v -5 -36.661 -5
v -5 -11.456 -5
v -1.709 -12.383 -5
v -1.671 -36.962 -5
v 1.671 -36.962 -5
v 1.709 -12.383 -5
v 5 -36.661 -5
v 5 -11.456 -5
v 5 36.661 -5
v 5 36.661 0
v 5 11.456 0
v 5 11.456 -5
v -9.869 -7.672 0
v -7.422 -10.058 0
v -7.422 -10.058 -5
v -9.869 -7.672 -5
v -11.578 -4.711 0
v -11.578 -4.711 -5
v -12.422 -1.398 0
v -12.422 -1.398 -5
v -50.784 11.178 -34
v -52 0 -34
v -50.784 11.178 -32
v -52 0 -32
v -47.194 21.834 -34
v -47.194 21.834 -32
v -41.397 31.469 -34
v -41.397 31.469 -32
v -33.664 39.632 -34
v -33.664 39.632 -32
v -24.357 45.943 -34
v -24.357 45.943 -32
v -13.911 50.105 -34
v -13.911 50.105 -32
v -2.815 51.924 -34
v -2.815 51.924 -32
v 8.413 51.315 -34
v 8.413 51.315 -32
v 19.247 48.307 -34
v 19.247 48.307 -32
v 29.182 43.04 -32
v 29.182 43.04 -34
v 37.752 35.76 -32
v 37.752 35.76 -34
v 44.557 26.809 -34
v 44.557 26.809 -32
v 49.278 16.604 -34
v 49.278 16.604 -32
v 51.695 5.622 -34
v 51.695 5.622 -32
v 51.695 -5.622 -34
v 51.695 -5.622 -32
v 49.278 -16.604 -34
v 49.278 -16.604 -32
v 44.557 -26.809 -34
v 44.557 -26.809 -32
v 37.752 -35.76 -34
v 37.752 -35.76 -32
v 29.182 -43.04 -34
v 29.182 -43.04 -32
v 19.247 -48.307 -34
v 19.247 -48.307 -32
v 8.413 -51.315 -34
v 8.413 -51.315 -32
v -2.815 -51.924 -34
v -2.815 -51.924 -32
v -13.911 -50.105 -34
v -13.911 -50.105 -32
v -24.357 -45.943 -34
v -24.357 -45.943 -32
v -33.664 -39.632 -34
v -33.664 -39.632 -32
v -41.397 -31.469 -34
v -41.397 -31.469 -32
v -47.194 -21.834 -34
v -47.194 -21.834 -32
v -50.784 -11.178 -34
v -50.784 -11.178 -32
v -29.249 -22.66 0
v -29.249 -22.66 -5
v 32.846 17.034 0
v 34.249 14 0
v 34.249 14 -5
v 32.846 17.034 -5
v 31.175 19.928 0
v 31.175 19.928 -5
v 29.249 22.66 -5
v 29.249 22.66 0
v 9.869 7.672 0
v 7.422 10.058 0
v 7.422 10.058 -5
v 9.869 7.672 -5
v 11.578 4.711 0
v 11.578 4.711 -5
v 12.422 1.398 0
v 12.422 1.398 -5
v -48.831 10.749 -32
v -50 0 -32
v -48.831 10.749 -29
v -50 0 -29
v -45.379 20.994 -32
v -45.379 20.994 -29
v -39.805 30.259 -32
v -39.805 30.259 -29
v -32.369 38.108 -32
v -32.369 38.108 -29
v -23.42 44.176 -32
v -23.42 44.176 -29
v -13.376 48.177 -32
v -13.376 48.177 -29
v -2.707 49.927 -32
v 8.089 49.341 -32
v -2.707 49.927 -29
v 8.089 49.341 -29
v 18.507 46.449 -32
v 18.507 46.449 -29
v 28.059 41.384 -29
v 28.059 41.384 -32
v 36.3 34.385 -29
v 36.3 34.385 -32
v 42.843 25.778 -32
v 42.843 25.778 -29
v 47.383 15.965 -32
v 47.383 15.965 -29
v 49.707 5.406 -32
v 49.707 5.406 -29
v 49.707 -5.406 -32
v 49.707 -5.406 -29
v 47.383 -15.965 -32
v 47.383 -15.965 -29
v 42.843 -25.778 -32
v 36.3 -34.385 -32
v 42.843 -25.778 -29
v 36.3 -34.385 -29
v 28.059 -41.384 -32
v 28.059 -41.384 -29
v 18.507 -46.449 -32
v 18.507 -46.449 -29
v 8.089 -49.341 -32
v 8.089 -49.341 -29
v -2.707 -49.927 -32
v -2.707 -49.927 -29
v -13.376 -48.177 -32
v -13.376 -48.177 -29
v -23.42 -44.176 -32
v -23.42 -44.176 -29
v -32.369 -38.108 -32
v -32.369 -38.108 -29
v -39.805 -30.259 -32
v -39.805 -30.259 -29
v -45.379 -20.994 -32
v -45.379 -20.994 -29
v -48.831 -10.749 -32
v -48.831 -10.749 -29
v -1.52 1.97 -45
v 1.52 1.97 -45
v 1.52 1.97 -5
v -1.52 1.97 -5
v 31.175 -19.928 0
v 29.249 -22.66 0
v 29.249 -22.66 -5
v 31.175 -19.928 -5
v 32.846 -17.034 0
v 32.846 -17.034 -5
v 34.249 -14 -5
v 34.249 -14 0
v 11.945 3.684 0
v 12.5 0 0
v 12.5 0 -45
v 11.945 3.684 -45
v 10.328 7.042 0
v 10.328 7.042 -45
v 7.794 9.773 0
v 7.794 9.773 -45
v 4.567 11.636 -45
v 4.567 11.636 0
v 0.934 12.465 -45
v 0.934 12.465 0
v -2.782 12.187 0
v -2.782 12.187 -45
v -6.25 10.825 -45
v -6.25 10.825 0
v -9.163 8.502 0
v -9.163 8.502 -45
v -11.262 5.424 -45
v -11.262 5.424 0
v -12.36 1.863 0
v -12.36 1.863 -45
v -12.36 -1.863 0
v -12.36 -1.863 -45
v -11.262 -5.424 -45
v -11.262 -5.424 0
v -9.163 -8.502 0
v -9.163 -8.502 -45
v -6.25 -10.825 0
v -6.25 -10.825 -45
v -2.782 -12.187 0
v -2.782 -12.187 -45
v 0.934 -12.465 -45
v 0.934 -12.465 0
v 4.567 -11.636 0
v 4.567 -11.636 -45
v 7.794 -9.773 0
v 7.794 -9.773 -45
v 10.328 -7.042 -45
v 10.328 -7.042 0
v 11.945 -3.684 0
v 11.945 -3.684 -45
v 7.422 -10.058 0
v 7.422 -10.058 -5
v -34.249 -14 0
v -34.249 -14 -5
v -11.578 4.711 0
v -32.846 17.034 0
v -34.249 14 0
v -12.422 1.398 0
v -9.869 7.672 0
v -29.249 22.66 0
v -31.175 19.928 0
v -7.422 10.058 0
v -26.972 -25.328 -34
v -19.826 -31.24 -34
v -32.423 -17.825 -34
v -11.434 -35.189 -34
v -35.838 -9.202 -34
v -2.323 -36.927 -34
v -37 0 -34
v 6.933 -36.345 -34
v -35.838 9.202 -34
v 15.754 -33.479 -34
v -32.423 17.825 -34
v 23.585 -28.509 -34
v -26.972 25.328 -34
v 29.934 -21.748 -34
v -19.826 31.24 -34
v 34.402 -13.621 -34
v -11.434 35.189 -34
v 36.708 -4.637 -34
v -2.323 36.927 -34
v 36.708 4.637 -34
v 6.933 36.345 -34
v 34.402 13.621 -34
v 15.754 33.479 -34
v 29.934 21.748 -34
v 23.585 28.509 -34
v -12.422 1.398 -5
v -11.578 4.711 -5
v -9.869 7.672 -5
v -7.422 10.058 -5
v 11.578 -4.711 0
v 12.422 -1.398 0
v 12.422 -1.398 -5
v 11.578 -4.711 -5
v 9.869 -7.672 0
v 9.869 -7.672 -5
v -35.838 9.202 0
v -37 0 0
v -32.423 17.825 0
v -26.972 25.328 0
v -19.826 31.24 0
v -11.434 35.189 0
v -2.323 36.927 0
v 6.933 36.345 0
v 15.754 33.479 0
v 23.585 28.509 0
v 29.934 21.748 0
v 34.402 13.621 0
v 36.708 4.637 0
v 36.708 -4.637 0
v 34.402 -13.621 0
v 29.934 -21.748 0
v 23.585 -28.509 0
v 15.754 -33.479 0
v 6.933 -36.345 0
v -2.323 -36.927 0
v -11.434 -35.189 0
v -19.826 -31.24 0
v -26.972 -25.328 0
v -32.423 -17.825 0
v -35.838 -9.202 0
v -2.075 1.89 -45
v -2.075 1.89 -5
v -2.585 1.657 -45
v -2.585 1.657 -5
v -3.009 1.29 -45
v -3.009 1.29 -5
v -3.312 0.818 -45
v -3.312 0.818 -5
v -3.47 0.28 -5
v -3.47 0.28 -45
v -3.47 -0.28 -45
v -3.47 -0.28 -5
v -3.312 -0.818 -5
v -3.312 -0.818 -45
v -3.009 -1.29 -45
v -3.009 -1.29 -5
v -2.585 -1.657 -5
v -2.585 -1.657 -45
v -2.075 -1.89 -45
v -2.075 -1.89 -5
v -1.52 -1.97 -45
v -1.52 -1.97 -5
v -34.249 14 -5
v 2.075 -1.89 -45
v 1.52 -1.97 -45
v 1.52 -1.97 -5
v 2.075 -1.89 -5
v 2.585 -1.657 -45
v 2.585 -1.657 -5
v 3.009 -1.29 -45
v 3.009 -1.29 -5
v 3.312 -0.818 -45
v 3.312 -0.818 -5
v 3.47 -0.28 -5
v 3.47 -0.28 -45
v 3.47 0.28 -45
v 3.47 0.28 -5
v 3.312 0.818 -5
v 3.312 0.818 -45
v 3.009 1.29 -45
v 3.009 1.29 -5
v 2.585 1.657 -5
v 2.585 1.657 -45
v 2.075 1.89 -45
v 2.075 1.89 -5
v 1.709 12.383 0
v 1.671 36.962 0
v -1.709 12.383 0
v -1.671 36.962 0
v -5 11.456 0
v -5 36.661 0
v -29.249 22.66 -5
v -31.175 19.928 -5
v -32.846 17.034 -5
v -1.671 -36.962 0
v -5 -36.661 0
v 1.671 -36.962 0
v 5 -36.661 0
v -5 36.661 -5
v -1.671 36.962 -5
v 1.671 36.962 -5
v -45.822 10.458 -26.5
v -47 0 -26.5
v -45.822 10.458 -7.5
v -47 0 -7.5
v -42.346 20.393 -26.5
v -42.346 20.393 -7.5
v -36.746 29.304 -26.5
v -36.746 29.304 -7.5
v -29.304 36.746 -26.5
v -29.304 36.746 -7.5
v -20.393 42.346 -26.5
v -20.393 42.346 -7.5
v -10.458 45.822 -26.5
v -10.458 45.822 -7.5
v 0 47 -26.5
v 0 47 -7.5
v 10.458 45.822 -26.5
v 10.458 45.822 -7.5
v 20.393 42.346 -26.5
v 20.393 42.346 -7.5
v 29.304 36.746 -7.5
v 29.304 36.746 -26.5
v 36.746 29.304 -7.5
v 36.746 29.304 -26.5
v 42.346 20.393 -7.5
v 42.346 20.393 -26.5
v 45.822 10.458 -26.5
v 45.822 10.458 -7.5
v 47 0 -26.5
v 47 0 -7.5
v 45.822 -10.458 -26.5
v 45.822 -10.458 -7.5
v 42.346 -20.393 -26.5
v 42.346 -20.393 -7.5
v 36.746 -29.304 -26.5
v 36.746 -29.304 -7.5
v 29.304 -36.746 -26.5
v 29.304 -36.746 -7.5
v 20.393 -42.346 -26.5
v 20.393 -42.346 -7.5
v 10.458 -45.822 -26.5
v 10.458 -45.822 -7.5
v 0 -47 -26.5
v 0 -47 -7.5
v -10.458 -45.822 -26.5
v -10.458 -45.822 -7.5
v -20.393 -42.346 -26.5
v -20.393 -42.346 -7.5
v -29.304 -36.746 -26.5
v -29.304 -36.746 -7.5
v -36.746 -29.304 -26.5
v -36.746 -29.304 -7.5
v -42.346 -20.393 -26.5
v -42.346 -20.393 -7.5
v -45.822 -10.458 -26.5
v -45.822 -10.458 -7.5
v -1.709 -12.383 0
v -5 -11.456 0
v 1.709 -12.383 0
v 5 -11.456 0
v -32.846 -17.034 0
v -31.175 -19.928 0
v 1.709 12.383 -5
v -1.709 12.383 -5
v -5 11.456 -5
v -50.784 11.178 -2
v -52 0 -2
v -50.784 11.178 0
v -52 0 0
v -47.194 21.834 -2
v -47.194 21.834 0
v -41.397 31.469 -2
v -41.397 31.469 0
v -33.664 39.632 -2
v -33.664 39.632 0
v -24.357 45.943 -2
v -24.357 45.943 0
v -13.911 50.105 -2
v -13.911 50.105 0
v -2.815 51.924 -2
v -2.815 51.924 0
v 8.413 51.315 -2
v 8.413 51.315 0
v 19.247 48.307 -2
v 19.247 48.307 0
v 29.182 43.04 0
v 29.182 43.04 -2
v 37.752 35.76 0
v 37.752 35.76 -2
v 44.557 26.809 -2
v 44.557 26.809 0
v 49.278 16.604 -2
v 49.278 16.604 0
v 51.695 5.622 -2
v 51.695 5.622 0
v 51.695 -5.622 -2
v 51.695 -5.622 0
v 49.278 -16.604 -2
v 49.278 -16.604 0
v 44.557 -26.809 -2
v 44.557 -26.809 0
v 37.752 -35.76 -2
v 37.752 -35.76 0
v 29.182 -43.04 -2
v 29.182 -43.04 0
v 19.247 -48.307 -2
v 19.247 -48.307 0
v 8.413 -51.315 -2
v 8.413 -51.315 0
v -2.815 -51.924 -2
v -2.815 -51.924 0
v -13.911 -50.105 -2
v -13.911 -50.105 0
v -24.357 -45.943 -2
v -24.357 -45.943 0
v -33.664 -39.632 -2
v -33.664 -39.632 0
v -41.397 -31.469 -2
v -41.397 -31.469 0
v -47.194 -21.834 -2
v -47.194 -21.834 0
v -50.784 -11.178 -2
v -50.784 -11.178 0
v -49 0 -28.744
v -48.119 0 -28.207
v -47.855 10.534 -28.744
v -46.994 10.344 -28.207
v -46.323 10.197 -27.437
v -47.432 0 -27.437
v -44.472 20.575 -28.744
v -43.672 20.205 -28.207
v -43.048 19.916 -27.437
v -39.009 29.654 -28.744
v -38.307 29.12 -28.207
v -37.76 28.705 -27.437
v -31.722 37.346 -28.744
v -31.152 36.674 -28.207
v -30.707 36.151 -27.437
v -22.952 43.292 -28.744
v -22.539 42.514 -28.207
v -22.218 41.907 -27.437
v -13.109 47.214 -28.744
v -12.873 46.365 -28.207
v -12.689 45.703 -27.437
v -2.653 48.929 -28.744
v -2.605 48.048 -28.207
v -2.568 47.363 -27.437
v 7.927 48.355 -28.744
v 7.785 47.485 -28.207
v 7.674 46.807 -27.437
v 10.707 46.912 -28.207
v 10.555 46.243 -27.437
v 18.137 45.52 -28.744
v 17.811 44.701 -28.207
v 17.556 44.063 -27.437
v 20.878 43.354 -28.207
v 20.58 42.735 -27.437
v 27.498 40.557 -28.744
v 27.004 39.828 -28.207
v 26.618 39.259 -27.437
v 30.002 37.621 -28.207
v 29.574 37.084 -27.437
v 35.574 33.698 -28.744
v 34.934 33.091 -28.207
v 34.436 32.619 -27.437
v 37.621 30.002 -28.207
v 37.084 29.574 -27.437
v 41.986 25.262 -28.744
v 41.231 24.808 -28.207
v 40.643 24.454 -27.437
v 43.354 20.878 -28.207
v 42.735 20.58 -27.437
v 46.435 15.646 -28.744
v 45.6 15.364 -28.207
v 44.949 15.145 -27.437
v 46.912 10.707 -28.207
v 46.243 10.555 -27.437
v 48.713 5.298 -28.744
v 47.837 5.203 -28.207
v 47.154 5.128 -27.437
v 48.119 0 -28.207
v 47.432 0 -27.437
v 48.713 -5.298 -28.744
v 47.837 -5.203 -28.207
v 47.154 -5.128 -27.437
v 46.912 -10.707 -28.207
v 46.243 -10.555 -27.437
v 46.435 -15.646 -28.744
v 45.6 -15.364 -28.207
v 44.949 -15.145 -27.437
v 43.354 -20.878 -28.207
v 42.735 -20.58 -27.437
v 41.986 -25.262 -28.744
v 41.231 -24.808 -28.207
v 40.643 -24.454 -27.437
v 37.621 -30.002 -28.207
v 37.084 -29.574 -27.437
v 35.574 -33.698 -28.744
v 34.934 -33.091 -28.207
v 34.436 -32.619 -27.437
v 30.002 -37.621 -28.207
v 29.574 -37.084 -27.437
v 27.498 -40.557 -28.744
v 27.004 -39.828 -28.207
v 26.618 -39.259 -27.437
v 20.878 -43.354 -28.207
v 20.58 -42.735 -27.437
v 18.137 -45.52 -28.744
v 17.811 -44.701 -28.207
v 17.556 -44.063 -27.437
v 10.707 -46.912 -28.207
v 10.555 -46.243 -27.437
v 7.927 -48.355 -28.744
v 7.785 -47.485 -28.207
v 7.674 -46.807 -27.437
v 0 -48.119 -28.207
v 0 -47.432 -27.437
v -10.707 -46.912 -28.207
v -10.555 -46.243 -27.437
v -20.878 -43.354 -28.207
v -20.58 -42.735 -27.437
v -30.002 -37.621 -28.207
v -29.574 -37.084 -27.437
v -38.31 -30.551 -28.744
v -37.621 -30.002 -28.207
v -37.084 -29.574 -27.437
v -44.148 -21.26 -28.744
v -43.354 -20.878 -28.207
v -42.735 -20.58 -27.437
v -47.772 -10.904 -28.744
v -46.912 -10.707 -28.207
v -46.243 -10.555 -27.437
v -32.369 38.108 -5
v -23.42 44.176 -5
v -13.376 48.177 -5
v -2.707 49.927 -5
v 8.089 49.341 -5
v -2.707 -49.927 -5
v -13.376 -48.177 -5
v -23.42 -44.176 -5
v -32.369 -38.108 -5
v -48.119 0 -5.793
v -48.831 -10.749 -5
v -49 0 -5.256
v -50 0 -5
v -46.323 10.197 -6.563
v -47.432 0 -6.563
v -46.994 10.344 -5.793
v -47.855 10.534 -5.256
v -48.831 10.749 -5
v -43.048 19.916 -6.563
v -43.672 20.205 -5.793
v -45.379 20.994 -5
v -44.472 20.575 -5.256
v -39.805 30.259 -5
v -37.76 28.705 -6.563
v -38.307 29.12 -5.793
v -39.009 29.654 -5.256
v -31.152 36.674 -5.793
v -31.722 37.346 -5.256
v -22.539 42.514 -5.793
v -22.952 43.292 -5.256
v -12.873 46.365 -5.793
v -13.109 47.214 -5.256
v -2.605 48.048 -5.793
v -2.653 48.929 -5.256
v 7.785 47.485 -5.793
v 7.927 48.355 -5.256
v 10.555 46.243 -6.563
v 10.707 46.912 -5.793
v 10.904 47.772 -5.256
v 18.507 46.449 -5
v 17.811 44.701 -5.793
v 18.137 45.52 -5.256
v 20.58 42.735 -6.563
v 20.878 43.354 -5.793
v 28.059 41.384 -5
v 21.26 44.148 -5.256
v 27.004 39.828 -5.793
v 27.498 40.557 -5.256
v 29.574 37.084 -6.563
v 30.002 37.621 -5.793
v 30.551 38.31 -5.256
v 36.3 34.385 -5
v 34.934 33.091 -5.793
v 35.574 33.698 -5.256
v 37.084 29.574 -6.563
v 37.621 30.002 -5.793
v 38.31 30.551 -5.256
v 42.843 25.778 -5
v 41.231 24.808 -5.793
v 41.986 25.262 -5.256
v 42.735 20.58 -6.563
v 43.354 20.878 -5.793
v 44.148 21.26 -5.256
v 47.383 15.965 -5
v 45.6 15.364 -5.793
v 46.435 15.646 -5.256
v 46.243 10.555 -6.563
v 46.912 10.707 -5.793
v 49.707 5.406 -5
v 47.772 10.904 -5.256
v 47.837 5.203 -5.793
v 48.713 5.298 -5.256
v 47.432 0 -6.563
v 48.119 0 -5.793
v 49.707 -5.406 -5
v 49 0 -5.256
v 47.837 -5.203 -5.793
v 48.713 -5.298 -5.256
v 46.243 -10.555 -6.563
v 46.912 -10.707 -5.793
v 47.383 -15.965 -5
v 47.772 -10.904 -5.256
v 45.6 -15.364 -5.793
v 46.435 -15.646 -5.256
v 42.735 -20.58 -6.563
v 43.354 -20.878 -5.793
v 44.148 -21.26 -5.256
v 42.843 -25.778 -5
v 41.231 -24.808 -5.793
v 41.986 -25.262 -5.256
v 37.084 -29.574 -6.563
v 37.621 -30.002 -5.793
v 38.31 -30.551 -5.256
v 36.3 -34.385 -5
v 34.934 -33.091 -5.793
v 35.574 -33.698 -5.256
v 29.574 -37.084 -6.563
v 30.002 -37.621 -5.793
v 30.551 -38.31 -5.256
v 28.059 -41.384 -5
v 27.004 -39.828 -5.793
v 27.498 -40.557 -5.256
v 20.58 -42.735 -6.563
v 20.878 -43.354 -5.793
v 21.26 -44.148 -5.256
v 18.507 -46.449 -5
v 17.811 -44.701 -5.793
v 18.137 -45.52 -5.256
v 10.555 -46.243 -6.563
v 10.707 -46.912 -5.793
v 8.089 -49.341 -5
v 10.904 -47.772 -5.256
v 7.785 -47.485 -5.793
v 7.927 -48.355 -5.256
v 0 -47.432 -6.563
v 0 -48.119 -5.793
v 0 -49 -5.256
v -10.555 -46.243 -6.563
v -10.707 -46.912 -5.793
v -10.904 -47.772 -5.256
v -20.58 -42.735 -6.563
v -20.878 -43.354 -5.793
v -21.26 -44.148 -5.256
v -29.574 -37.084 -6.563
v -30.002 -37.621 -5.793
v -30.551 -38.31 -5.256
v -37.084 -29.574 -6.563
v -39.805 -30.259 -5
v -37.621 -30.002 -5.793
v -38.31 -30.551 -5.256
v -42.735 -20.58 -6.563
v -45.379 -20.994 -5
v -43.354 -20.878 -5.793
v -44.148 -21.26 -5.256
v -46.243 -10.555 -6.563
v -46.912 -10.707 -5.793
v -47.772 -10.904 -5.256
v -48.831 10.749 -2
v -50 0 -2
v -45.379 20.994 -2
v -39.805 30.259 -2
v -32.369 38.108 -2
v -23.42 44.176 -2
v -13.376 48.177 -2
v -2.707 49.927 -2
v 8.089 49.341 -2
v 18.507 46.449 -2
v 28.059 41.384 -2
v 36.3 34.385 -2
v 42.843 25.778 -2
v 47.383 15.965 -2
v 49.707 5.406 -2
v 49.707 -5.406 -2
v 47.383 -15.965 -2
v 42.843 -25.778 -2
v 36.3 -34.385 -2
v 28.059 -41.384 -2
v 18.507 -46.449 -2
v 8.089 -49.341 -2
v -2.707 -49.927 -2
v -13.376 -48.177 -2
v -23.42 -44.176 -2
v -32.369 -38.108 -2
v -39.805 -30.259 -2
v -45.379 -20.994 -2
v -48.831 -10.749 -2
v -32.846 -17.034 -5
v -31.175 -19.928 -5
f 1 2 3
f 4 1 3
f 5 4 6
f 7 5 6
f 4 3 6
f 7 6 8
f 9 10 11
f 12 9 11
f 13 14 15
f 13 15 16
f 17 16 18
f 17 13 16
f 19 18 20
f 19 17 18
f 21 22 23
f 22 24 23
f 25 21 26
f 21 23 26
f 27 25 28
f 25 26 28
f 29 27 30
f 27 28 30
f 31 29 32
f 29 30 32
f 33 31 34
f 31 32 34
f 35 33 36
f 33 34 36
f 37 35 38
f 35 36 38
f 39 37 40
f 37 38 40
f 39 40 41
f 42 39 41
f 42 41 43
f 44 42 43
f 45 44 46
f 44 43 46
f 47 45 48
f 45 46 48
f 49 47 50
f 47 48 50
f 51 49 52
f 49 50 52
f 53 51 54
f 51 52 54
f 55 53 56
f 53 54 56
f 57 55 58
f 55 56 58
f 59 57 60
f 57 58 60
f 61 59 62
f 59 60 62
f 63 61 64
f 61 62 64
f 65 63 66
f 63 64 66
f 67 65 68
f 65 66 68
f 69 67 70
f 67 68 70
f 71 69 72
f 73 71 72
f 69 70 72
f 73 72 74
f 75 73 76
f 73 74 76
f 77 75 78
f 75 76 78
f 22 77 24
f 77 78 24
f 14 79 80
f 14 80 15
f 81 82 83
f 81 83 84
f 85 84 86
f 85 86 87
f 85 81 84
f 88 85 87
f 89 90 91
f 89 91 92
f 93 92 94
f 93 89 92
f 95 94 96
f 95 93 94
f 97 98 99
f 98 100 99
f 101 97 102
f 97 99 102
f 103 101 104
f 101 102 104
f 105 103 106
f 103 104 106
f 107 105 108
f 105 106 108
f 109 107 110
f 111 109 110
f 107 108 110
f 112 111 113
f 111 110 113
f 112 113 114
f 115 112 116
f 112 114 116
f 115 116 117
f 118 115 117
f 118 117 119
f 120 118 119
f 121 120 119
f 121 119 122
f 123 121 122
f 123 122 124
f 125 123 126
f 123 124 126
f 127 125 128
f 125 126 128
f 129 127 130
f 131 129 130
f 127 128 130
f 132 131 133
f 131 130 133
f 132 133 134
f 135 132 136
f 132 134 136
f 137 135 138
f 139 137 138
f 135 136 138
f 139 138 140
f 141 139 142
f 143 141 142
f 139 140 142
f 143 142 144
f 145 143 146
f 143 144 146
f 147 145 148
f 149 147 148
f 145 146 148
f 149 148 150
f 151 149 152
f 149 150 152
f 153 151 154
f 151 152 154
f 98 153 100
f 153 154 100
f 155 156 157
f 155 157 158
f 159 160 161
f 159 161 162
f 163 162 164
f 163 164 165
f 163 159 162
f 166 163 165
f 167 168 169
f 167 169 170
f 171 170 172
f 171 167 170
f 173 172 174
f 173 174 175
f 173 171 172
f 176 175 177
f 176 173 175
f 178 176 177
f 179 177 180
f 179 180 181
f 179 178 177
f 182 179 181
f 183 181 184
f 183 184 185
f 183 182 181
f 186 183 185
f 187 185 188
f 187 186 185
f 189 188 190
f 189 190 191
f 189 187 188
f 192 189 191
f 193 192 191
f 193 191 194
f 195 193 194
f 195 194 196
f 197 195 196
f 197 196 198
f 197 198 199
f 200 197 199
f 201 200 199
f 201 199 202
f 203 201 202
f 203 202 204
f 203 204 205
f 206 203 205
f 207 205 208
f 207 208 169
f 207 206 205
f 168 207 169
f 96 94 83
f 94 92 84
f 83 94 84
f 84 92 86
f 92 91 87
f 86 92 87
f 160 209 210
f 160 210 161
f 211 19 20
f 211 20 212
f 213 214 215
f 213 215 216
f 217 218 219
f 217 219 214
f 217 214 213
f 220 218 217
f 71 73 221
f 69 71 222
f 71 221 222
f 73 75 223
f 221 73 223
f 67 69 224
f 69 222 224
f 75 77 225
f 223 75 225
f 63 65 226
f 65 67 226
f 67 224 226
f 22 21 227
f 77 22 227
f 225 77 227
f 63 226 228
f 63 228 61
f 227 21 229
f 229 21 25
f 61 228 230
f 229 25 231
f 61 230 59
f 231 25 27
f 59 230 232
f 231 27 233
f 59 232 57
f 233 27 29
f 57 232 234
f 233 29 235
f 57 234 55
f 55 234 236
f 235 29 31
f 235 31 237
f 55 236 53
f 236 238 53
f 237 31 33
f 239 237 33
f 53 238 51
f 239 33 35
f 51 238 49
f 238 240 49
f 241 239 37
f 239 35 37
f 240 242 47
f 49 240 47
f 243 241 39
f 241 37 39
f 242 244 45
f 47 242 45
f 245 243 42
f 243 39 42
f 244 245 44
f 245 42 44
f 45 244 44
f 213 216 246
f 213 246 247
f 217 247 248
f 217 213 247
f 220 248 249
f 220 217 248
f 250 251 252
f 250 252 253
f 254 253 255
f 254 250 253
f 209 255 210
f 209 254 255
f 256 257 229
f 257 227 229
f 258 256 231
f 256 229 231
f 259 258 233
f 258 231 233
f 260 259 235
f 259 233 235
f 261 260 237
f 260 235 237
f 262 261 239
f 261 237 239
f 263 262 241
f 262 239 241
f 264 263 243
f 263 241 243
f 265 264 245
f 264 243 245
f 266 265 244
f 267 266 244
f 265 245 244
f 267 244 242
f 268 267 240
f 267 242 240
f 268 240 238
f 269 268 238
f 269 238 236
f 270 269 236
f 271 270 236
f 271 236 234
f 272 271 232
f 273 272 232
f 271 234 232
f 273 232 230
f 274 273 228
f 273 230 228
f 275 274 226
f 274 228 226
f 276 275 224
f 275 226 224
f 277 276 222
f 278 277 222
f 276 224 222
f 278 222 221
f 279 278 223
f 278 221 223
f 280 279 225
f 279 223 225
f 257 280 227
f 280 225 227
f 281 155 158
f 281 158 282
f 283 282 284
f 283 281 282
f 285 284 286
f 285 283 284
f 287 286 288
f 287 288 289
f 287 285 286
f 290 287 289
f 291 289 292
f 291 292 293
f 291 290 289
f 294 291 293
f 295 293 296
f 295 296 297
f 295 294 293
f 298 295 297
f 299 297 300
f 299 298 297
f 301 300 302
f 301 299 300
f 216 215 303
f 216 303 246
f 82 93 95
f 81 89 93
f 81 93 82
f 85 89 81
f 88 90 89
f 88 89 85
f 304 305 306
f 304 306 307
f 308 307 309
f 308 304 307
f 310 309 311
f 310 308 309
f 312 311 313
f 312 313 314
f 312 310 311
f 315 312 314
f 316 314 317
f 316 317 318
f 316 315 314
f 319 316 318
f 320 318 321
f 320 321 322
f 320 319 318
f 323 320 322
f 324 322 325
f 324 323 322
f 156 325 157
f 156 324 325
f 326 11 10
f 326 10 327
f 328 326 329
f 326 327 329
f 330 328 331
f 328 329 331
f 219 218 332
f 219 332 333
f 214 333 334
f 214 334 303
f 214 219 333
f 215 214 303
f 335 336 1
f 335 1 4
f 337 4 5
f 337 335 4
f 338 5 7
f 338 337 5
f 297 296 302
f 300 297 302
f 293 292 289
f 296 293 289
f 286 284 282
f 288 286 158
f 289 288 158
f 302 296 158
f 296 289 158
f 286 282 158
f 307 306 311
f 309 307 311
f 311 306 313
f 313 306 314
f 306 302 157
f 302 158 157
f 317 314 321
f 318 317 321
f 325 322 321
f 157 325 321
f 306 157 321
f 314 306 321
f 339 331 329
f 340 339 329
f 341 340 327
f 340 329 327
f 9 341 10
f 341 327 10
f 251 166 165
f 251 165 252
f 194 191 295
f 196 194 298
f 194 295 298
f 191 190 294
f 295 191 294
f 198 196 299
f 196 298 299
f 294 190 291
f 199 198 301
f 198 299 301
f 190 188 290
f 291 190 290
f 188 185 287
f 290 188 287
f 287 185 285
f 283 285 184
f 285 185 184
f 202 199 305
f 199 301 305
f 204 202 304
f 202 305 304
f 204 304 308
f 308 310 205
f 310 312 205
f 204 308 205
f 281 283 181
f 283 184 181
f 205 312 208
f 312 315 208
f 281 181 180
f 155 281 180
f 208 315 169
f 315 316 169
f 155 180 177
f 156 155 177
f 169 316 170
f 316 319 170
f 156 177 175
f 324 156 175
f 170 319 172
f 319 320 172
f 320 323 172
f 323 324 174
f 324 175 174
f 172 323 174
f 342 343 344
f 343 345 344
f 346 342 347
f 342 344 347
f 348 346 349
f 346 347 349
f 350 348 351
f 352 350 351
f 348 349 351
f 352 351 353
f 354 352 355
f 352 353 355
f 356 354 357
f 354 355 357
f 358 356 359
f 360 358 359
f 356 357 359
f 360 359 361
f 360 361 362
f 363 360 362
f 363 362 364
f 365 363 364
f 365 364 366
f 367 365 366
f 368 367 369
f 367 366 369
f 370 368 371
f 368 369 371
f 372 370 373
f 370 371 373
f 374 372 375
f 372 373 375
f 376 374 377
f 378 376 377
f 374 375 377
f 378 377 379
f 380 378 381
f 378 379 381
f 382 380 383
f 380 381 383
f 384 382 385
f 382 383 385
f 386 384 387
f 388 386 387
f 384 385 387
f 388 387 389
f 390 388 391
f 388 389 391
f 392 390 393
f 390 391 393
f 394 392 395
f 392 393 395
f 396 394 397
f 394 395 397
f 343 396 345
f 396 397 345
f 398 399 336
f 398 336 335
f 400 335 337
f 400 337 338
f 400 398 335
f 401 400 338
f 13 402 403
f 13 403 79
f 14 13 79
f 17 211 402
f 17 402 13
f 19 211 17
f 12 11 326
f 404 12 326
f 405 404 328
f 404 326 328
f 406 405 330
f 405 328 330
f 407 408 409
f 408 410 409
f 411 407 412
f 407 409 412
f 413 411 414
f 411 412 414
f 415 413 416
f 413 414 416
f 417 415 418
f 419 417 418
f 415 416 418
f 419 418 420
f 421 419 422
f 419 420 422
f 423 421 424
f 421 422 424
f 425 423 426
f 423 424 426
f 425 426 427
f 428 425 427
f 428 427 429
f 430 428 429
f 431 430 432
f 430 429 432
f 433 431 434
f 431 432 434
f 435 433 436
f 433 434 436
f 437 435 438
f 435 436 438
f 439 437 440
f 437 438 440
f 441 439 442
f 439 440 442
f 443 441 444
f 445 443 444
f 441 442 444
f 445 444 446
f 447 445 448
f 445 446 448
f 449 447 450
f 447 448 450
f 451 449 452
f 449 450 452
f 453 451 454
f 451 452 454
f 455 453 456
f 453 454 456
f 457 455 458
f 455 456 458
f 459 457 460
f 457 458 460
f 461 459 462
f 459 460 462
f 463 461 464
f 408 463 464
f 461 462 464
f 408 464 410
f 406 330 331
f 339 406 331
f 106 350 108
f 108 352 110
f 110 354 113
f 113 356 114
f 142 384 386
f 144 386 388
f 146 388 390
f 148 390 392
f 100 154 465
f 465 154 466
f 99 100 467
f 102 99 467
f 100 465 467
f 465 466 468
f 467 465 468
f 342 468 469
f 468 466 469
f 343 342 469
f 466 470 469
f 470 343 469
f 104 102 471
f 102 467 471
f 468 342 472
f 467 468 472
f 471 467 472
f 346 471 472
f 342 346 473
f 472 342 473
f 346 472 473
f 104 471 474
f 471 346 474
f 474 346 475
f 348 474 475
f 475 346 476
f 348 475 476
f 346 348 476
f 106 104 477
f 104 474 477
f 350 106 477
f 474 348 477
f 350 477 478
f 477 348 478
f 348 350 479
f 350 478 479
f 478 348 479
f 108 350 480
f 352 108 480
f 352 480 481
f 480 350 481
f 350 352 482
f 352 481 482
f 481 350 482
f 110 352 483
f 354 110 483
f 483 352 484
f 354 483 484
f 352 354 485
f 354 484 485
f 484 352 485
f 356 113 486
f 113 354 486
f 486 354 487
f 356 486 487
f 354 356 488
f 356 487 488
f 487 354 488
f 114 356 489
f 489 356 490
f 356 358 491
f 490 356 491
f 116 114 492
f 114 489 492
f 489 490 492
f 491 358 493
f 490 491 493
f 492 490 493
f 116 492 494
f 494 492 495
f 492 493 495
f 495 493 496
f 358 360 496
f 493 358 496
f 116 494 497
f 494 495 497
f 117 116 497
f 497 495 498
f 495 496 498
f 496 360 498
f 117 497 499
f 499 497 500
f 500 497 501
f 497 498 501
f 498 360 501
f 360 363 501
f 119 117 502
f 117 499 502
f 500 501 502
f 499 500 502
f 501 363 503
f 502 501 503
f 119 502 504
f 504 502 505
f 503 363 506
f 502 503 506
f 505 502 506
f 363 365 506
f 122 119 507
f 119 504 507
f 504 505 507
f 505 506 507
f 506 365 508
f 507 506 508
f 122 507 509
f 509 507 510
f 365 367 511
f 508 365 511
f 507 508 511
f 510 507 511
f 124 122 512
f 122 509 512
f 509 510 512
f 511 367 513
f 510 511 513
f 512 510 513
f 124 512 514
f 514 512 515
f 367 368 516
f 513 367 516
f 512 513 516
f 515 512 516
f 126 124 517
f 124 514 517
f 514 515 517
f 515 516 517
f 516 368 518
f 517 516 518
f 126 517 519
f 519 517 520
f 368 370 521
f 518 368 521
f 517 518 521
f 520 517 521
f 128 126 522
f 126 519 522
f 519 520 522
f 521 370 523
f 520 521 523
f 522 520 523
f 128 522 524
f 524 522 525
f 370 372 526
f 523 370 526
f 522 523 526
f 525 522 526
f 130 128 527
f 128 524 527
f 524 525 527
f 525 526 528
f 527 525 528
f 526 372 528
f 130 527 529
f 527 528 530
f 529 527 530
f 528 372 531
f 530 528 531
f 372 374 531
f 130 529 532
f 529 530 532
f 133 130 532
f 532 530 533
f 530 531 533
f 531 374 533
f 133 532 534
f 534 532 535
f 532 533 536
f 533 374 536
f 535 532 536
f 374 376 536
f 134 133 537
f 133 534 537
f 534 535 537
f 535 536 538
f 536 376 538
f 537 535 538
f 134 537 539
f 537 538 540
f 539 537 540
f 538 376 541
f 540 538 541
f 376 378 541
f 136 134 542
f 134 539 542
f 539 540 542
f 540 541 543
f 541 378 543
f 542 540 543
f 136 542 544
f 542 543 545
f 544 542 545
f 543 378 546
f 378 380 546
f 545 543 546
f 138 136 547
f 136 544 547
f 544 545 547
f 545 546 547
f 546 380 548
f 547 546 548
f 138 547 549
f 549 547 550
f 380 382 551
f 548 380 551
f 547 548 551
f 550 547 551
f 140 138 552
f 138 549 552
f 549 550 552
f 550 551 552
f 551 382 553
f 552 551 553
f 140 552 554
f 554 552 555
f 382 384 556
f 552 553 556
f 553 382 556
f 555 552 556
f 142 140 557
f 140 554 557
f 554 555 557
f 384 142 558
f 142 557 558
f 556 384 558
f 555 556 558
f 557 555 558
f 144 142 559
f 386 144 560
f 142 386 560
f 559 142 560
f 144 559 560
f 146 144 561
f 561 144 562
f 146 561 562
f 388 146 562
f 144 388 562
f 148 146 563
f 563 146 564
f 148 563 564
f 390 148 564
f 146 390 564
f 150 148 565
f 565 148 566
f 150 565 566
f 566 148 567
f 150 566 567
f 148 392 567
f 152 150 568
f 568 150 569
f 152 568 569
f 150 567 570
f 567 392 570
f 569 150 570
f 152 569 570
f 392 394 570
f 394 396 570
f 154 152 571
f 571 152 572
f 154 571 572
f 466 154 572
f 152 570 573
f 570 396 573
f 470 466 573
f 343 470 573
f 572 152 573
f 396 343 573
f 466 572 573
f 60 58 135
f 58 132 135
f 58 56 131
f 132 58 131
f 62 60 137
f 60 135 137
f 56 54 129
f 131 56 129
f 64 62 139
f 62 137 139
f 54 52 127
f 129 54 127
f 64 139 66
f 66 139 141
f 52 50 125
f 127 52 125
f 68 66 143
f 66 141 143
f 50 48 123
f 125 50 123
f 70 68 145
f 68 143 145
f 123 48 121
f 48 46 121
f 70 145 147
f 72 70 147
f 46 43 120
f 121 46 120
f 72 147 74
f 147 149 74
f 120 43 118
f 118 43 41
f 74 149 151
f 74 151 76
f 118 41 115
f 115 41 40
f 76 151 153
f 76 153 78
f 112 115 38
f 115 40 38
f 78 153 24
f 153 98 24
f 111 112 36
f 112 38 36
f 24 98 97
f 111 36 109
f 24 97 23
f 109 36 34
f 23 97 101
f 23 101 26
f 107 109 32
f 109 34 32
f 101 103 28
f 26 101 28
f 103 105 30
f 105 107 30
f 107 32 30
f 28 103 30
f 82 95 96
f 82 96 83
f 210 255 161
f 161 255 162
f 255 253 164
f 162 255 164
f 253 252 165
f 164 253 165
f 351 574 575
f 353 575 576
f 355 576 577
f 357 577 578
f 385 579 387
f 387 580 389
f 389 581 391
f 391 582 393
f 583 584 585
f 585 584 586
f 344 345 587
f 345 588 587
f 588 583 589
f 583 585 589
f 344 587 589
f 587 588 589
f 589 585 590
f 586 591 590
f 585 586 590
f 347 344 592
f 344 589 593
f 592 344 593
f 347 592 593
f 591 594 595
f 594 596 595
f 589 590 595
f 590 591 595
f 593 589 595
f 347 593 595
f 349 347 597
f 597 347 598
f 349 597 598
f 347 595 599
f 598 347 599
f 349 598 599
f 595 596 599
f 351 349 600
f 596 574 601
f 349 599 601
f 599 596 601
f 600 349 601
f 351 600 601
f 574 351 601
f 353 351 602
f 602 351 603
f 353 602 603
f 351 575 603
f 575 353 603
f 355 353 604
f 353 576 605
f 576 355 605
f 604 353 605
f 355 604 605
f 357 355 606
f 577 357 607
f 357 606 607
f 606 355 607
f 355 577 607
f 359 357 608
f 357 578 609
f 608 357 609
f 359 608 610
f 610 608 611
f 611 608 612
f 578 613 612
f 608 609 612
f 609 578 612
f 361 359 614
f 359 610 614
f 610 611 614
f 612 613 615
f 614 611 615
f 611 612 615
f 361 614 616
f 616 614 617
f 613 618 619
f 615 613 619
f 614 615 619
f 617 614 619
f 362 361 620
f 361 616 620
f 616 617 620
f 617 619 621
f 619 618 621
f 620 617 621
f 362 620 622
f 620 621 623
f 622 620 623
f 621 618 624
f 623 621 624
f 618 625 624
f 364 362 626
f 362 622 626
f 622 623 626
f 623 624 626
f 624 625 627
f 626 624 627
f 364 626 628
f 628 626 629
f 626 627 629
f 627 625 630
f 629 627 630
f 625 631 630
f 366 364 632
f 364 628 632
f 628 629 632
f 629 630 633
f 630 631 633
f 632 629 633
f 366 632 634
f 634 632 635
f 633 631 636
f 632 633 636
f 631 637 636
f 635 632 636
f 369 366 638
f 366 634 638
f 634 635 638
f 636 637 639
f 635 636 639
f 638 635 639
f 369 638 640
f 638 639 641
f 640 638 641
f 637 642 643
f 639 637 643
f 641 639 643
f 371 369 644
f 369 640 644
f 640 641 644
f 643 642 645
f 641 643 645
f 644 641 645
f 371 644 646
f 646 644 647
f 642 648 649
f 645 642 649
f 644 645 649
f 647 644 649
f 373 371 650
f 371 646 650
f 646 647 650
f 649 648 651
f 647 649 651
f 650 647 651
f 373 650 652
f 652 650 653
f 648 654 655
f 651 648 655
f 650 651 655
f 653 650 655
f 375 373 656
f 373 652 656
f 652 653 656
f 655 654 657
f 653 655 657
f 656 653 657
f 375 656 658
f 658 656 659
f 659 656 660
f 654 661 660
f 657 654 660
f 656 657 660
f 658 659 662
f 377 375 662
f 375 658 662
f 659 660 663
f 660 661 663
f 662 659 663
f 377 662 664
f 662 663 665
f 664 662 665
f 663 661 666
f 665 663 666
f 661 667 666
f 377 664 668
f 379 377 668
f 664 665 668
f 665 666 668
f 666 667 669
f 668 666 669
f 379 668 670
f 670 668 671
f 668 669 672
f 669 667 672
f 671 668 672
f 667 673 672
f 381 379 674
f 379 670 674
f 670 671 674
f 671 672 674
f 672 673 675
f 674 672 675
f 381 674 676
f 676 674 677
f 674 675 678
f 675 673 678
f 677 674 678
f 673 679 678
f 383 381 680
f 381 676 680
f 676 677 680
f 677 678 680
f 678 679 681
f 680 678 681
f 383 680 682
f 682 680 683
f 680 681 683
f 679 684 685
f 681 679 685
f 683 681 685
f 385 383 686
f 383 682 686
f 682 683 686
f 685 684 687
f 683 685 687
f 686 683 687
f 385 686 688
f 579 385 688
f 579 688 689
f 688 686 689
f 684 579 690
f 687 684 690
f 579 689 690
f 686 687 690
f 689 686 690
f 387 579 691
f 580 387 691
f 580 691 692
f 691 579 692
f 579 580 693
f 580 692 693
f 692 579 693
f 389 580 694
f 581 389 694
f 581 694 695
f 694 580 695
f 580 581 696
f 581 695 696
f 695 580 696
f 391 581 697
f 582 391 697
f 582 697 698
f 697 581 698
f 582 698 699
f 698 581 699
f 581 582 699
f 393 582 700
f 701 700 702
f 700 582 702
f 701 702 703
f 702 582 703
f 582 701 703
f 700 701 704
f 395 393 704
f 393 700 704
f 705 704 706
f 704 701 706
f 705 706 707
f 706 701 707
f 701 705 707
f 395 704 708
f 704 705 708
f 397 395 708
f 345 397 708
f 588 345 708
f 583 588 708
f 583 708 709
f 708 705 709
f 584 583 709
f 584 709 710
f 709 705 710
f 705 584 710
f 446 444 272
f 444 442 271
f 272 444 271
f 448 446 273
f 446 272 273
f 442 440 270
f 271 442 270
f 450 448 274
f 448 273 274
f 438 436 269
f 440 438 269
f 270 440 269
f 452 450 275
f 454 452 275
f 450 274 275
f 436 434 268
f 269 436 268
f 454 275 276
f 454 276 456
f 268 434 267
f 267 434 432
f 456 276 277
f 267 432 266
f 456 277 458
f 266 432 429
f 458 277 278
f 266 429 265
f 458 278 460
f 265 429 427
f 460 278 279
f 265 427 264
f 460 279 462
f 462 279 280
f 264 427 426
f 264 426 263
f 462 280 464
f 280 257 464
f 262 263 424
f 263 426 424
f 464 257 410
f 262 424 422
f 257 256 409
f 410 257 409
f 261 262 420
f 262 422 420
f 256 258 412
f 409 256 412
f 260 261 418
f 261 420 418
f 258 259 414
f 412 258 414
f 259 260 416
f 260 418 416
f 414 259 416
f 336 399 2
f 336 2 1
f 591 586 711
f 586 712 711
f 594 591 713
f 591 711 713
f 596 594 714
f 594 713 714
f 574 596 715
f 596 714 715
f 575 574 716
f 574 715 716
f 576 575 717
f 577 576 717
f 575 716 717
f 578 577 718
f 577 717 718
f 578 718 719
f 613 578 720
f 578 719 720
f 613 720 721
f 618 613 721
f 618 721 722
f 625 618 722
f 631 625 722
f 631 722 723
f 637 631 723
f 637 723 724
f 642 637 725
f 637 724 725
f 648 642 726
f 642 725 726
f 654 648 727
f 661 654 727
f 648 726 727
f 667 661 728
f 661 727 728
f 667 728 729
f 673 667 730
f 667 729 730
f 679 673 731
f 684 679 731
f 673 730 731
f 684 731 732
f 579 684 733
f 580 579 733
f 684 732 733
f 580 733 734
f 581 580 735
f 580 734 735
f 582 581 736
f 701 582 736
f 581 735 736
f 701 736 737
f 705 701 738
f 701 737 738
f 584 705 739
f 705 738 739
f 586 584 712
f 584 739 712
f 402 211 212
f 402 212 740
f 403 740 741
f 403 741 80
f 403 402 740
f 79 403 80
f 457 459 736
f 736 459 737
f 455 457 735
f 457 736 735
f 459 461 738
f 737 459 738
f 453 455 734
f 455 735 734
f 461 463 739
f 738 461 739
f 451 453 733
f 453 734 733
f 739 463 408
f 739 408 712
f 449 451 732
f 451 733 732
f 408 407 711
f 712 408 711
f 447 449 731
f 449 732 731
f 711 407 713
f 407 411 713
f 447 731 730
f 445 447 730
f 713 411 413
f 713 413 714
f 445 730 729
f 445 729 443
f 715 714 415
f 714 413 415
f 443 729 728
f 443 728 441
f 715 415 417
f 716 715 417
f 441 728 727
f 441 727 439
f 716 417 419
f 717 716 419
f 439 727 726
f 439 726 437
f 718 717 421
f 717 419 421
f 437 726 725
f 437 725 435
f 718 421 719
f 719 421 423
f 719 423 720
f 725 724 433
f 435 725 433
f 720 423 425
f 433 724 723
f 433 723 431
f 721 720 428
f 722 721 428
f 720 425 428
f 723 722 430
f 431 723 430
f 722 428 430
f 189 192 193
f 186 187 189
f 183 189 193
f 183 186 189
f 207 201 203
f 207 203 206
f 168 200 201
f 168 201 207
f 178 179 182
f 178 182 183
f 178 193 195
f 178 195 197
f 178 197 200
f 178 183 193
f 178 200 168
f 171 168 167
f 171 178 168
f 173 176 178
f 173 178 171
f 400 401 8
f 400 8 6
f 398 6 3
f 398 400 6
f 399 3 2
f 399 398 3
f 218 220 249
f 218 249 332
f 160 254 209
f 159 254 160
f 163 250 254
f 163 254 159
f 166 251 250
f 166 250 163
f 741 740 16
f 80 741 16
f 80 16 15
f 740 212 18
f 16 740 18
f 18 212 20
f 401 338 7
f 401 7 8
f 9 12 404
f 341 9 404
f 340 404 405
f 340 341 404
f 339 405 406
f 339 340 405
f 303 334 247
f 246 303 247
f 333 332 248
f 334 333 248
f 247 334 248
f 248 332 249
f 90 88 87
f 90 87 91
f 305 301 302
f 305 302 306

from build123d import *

# Parameters (mm, degrees)
SKETCH2_R             = 12.5
SKETCH2_R_2           = 7.5
BOSS_EXTRUDE1_DEPTH   = 45
BOSS_EXTRUDE6_DEPTH   = 5
BOSS_EXTRUDE6_2_DEPTH = 5
BOSS_EXTRUDE6_3_DEPTH = 5
BOSS_EXTRUDE6_4_DEPTH = 5
BOSS_EXTRUDE6_5_DEPTH = 5
BOSS_EXTRUDE6_6_DEPTH = 5
CUT_EXTRUDE1_DEPTH    = 40


with BuildPart() as part:
    # Sketch1 → Revolve1 (revolve)
    with BuildSketch(Plane(origin=(0, 0, 0), x_dir=(0, 0, -1), z_dir=(1, 0, 0)), mode=Mode.PRIVATE) as revolve1_sk:
        with BuildLine():
            Line((5, 50), (2, 50))
            Line((2, 50), (2, 52))
            Line((2, 52), (0, 52))
            Line((0, 52), (0, 37))
            Line((0, 37), (17, 37))
            Line((17, 37), (17, 47))
            Line((17, 47), (7.5, 47))
            ThreePointArc((7.5, 47), (5.792706688, 48.11892224), (5, 50))
        make_face()
        with BuildLine():
            Line((26.5, 47), (17, 47))
            Line((17, 47), (17, 37))
            Line((17, 37), (34, 37))
            Line((34, 37), (34, 52))
            Line((34, 52), (32, 52))
            Line((32, 52), (32, 50))
            Line((32, 50), (29, 50))
            ThreePointArc((29, 50), (28.207293312, 48.11892224), (26.5, 47))
        make_face()
    revolve(revolve1_sk.sketch.rotate(Axis((0, 0, 0), (0, 0, -1)), 270), axis=Axis((0, 0, 0), (0, 0, -1)))


with BuildPart() as body_2:
    # Sketch2 → Boss-Extrude1 (new body)
    # profile 1 of 2: a face of its own
    with BuildSketch(Plane.XY):
        Circle(SKETCH2_R)
        Circle(SKETCH2_R_2, mode=Mode.SUBTRACT)
    # profile 2 of 2: a face of its own
    with BuildSketch(Plane.XY):
        Circle(SKETCH2_R_2)
    extrude(amount=-BOSS_EXTRUDE1_DEPTH)

    # Sketch4 → Cut-Extrude1 (cut)
    with BuildSketch(Plane(origin=(0, 0, -45), x_dir=(-1, 0, 0), z_dir=(0, 0, -1))):
        with BuildLine():
            Line((-1.52, 1.97), (1.52, 1.97))
            ThreePointArc((1.52, 1.97), (3.49, 0), (1.52, -1.97))
            Line((1.52, -1.97), (-1.52, -1.97))
            ThreePointArc((-1.52, -1.97), (-3.49, 0), (-1.52, 1.97))
        make_face()
    extrude(amount=-CUT_EXTRUDE1_DEPTH, mode=Mode.SUBTRACT)


with BuildPart() as body_3:
    # Sketch3 → Boss-Extrude6 (new body)
    with BuildSketch(Plane.XY):
        with BuildLine():
            Line((-5, 11.456439237), (-5, 36.66060556))
            ThreePointArc((-5, 36.66060556), (0, 37), (5, 36.66060556))
            Line((5, 36.66060556), (5, 11.456439237))
            ThreePointArc((5, 11.456439237), (0, 12.5), (-5, 11.456439237))
        make_face()
    extrude(amount=-BOSS_EXTRUDE6_DEPTH)


with BuildPart() as body_4:
    # Sketch3 → Boss-Extrude6 2 (new body)
    with BuildSketch(Plane.XY):
        with BuildLine():
            Line((12.421567417, 1.3980926), (34.249015733, 14.000175761))
            ThreePointArc((34.249015733, 14.000175761), (32.04293994, 18.5), (29.249015733, 22.660429799))
            Line((29.249015733, 22.660429799), (7.421567417, 10.058346638))
            ThreePointArc((7.421567417, 10.058346638), (10.825317547, 6.25), (12.421567417, 1.3980926))
        make_face()
    extrude(amount=-BOSS_EXTRUDE6_2_DEPTH)


with BuildPart() as body_5:
    # Sketch3 → Boss-Extrude6 3 (new body)
    with BuildSketch(Plane.XY):
        with BuildLine():
            Line((7.421567417, -10.058346638), (29.249015733, -22.660429799))
            ThreePointArc((29.249015733, -22.660429799), (32.04293994, -18.5), (34.249015733, -14.000175761))
            Line((34.249015733, -14.000175761), (12.421567417, -1.3980926))
            ThreePointArc((12.421567417, -1.3980926), (10.825317547, -6.25), (7.421567417, -10.058346638))
        make_face()
    extrude(amount=-BOSS_EXTRUDE6_3_DEPTH)


with BuildPart() as body_6:
    # Sketch3 → Boss-Extrude6 4 (new body)
    with BuildSketch(Plane.XY):
        with BuildLine():
            Line((-5, -11.456439237), (-5, -36.66060556))
            ThreePointArc((-5, -36.66060556), (0, -37), (5, -36.66060556))
            Line((5, -36.66060556), (5, -11.456439237))
            ThreePointArc((5, -11.456439237), (0, -12.5), (-5, -11.456439237))
        make_face()
    extrude(amount=-BOSS_EXTRUDE6_4_DEPTH)


with BuildPart() as body_7:
    # Sketch3 → Boss-Extrude6 5 (new body)
    with BuildSketch(Plane.XY):
        with BuildLine():
            Line((-12.421567417, -1.3980926), (-34.249015733, -14.000175761))
            ThreePointArc((-34.249015733, -14.000175761), (-32.04293994, -18.5), (-29.249015733, -22.660429799))
            Line((-29.249015733, -22.660429799), (-7.421567417, -10.058346638))
            ThreePointArc((-7.421567417, -10.058346638), (-10.825317547, -6.25), (-12.421567417, -1.3980926))
        make_face()
    extrude(amount=-BOSS_EXTRUDE6_5_DEPTH)


with BuildPart() as body_8:
    # Sketch3 → Boss-Extrude6 6 (new body)
    with BuildSketch(Plane.XY):
        with BuildLine():
            Line((-7.421567417, 10.058346638), (-29.249015733, 22.660429799))
            ThreePointArc((-29.249015733, 22.660429799), (-32.04293994, 18.5), (-34.249015733, 14.000175761))
            Line((-34.249015733, 14.000175761), (-12.421567417, 1.3980926))
            ThreePointArc((-12.421567417, 1.3980926), (-10.825317547, 6.25), (-7.421567417, 10.058346638))
        make_face()
    extrude(amount=-BOSS_EXTRUDE6_6_DEPTH)


solid = Compound([part.part, body_2.part, body_3.part, body_4.part, body_5.part, body_6.part, body_7.part, body_8.part])
